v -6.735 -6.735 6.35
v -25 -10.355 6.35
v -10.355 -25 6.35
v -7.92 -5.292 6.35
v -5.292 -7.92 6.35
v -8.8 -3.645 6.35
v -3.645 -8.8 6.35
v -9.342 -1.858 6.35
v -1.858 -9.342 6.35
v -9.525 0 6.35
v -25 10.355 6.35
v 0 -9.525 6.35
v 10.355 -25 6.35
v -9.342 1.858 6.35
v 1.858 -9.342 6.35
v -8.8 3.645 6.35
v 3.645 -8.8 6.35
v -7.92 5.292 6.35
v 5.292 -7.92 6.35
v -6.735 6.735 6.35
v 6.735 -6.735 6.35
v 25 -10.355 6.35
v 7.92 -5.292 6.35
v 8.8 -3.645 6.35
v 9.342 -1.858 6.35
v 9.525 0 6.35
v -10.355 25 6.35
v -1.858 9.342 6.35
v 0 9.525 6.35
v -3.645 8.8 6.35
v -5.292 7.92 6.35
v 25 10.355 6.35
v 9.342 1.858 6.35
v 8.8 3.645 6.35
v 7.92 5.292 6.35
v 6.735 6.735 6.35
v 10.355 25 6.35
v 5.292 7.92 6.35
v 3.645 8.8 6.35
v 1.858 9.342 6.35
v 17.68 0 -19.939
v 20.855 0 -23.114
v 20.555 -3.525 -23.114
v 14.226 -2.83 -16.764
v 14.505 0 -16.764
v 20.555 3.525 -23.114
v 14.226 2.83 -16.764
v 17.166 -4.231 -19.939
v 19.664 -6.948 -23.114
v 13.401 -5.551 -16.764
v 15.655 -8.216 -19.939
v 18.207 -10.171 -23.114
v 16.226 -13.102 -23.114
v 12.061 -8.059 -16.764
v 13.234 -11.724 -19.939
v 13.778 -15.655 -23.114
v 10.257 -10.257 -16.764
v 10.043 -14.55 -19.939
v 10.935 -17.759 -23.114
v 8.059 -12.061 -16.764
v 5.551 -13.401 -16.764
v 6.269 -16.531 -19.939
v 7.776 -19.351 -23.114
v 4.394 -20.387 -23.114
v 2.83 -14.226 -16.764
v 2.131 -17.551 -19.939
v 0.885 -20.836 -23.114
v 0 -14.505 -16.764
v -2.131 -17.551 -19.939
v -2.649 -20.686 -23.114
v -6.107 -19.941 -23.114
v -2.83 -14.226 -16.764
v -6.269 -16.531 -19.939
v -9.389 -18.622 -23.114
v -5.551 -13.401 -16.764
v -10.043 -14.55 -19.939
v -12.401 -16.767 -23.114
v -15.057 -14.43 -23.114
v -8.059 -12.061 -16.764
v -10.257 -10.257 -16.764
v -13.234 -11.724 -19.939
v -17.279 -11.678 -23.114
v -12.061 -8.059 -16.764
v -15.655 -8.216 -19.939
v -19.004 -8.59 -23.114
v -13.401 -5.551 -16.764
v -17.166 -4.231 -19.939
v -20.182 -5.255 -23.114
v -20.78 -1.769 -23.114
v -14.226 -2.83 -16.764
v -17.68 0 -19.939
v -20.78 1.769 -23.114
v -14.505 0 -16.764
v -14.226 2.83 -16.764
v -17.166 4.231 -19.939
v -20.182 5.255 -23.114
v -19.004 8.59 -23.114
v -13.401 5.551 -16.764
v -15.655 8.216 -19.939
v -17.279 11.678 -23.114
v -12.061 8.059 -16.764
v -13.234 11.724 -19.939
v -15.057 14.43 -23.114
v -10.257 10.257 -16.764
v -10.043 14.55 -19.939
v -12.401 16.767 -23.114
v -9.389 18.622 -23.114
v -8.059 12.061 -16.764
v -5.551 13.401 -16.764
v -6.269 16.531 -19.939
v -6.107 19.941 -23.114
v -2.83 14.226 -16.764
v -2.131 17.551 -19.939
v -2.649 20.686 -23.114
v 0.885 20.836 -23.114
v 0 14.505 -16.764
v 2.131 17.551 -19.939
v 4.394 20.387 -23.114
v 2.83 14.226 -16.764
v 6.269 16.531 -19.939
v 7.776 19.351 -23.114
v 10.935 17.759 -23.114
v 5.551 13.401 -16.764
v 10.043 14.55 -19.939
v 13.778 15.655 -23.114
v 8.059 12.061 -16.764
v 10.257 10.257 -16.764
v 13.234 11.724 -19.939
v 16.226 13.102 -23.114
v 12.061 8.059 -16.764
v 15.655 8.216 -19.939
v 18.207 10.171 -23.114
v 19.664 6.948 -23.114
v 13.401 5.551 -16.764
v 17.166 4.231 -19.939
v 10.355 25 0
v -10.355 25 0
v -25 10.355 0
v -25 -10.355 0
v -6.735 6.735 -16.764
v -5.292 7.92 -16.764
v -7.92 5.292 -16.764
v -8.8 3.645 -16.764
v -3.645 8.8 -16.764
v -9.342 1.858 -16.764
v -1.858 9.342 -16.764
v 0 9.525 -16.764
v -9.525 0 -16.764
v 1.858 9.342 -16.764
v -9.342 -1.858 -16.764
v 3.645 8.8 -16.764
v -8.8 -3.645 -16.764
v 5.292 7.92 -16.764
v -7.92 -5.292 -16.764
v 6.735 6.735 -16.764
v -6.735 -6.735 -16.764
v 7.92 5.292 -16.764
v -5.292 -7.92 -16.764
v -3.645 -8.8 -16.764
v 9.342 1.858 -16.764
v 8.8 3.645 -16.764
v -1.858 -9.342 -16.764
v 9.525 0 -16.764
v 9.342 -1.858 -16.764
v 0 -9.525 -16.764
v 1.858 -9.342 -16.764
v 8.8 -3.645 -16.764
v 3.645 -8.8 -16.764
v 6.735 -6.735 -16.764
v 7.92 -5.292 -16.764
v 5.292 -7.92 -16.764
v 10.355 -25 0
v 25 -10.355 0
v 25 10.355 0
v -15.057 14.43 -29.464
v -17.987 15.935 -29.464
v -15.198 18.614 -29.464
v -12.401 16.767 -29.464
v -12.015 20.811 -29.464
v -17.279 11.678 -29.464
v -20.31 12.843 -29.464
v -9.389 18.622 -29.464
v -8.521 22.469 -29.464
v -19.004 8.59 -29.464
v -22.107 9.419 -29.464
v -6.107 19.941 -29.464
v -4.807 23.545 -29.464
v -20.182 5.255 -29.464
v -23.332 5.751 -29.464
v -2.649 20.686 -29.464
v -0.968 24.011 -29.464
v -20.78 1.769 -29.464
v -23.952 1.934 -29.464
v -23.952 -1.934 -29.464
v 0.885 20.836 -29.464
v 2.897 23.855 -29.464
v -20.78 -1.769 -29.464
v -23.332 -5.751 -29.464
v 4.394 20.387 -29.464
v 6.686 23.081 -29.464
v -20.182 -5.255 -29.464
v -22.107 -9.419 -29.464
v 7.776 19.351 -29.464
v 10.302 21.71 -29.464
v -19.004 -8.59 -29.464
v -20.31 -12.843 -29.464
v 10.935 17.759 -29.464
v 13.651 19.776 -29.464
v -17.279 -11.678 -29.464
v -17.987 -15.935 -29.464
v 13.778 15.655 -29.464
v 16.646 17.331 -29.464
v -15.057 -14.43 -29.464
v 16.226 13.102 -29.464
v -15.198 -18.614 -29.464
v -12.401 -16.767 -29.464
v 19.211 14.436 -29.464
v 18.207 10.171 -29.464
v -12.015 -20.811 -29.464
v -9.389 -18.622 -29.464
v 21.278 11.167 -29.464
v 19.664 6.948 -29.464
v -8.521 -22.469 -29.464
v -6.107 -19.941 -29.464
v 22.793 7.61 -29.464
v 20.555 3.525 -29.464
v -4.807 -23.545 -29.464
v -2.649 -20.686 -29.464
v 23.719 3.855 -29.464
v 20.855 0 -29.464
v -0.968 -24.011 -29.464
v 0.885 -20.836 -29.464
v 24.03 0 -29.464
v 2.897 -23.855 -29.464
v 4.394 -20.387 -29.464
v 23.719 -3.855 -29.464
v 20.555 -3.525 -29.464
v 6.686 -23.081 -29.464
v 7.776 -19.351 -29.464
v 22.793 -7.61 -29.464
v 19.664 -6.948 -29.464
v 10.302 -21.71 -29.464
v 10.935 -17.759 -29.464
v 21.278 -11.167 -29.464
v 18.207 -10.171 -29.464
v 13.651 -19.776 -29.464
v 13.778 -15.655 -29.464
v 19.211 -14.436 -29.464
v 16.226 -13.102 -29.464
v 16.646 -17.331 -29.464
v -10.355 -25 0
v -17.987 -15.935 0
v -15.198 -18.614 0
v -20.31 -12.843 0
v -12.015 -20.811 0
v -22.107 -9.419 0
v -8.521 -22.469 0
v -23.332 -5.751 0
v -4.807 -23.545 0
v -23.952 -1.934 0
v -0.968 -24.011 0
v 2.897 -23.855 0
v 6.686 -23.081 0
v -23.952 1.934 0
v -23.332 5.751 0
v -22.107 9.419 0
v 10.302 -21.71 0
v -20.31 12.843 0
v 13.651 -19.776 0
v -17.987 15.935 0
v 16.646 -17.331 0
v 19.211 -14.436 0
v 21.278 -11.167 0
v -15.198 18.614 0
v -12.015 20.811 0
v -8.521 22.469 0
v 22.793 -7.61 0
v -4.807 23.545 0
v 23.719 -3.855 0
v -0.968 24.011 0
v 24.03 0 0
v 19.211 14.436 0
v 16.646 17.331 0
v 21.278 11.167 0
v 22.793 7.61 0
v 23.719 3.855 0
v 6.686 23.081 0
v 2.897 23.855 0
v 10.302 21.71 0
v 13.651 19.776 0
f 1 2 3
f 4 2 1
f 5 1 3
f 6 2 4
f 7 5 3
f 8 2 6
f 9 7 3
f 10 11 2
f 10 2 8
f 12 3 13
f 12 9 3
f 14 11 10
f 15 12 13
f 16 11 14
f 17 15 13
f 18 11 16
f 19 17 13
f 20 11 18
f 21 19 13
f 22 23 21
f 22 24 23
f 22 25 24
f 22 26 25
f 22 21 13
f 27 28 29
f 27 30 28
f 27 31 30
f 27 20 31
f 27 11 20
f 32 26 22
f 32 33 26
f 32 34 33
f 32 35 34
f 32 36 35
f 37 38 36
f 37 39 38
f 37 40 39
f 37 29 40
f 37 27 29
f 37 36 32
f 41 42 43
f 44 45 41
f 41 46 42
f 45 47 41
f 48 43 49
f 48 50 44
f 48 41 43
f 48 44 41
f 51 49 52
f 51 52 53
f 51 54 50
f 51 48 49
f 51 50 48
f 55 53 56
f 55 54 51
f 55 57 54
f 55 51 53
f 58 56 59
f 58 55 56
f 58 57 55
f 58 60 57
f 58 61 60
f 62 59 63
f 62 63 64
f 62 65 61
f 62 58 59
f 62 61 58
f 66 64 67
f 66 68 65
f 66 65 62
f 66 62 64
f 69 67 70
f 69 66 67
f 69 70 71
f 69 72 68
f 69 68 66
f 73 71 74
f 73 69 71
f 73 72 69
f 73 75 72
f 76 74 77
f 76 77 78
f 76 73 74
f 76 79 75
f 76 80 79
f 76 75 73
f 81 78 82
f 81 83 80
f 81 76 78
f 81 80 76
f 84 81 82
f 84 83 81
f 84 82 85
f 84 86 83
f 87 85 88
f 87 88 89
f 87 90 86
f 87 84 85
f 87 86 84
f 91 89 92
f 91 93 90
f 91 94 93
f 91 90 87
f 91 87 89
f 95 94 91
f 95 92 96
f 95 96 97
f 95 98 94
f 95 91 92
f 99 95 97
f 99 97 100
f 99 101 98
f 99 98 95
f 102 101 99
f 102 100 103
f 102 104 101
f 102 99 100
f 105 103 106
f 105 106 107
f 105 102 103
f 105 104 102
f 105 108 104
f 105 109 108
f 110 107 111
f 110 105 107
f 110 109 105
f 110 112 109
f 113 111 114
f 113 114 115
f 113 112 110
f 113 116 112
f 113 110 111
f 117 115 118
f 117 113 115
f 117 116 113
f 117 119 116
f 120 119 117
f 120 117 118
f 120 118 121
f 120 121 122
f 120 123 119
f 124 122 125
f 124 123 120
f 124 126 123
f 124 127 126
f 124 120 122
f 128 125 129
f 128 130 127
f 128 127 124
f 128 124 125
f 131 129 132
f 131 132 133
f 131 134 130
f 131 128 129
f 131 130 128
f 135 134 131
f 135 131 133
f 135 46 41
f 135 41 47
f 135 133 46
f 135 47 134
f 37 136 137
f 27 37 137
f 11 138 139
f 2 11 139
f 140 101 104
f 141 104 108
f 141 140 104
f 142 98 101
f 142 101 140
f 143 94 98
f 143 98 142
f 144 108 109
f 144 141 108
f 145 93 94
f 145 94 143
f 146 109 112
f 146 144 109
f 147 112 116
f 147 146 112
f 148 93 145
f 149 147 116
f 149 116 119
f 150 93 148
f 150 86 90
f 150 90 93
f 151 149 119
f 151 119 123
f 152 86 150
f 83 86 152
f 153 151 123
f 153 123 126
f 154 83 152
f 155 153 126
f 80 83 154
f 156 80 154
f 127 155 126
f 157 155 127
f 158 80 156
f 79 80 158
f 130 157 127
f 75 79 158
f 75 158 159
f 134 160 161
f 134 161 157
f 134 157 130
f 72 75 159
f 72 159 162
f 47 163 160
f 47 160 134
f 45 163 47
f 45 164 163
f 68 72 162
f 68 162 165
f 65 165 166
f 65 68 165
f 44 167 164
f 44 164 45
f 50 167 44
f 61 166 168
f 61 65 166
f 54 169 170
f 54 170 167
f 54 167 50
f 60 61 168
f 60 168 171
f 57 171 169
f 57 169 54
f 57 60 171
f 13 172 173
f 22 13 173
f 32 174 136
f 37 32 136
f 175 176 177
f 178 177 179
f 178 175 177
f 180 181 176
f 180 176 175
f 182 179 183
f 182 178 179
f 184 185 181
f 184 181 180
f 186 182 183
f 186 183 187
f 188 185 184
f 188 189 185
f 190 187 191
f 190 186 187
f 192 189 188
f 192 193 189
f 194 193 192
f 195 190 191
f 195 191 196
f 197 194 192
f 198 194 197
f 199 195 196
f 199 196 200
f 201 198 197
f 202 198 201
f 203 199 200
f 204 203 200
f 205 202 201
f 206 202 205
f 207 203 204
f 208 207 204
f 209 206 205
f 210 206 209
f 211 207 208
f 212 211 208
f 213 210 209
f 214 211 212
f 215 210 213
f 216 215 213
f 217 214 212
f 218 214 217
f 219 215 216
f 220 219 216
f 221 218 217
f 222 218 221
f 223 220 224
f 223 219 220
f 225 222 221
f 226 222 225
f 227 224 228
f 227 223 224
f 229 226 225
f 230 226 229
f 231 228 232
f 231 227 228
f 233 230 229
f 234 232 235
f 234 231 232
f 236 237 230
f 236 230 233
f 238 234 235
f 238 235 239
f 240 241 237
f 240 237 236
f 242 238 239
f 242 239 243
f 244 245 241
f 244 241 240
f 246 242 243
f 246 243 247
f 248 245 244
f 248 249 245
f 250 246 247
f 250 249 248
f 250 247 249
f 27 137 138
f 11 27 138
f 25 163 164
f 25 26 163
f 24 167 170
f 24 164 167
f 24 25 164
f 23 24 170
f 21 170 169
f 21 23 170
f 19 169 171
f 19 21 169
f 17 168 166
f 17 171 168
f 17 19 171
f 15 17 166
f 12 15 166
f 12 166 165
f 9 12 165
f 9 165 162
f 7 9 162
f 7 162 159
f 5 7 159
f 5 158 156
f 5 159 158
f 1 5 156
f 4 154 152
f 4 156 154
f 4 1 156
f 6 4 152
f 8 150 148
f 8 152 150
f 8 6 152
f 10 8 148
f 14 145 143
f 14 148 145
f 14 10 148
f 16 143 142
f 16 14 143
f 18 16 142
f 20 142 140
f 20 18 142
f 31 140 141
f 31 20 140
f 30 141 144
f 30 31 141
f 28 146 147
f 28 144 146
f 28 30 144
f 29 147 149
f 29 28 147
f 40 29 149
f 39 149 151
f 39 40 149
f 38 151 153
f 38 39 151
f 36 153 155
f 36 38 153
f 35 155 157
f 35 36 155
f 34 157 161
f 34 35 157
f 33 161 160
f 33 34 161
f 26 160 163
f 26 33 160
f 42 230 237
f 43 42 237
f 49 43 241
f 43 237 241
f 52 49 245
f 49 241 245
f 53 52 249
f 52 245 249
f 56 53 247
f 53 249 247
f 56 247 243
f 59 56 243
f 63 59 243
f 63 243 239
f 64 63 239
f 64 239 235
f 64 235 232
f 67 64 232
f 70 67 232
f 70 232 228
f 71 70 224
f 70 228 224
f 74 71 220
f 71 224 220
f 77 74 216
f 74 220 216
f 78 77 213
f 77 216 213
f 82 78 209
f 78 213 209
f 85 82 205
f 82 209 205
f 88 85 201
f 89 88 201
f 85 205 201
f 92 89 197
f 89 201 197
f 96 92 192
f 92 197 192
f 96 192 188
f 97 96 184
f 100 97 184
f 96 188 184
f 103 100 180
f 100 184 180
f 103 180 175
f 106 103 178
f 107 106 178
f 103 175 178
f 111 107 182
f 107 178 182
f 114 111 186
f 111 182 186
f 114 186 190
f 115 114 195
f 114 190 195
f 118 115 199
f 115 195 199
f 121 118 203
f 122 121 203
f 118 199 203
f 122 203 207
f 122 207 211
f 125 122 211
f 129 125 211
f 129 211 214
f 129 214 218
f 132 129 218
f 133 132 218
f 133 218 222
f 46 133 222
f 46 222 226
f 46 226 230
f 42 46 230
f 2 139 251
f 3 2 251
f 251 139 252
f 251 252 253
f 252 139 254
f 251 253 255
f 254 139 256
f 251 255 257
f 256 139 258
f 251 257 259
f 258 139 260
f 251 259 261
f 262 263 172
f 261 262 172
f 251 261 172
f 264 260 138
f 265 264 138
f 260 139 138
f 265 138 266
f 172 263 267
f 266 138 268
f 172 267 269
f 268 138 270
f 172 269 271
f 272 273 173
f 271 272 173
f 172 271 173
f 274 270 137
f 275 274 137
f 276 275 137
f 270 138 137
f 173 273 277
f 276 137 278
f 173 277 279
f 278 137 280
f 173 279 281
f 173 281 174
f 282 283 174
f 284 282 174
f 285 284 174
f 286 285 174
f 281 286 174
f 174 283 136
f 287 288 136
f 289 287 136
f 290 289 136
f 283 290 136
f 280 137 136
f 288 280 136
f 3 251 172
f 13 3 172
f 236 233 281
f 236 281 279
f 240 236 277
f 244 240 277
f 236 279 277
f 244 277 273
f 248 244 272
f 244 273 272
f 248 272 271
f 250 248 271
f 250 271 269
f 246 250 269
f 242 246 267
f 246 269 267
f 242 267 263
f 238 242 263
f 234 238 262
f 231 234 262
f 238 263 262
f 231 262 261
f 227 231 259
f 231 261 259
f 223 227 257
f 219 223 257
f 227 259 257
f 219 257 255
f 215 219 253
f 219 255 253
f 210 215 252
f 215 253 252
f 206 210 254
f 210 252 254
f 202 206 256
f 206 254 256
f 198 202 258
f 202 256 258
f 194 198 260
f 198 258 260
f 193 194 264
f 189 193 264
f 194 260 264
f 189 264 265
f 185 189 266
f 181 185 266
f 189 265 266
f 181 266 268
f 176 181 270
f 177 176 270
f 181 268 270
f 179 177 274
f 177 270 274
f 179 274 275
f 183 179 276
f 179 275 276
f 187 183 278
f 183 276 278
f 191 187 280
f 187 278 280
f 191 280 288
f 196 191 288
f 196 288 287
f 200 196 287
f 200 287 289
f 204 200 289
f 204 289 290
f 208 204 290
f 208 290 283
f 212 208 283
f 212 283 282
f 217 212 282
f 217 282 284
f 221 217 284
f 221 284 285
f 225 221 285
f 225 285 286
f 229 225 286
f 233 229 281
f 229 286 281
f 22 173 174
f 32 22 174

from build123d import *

# Parameters (mm, degrees)
F0_R     = 9.525
F1_DEPTH = 6.35
F2_R     = 24.030165
F2_R_2   = 9.525
F3_DEPTH = 29.464
F4_R     = 20.855165
F5_DEPTH = 12.7
F6_SIZE  = 6.35


with BuildPart() as f1:
    # F0 (on Top) → F1 (new body)
    with BuildSketch(Plane.XY):
        Polygon((-10.355339, -25), (10.355339, -25), (25, -10.355339), (25, 10.355339), (10.355339, 25), (-10.355339, 25), (-25, 10.355339), (-25, -10.355339), align=None)
        Circle(F0_R, mode=Mode.SUBTRACT)
    extrude(amount=F1_DEPTH)

    # F2 (on face) → F3 (join)
    with BuildSketch(Plane(origin=(0, 0, 0), x_dir=(1, 0, 0), z_dir=(0, 0, -1))):
        Circle(F2_R)
        Circle(F2_R_2, mode=Mode.SUBTRACT)
    extrude(amount=F3_DEPTH)

    # F4 (on face) → F5 (cut)
    with BuildSketch(Plane(origin=(0, 0, -29.464), x_dir=(1, 0, 0), z_dir=(0, 0, -1))):
        Circle(F4_R)
    extrude(amount=-F5_DEPTH, mode=Mode.SUBTRACT)

    # F6
    f6_edges = [f1.edges().sort_by_distance(p)[0] for p in [
        (-20.855165, 0, -16.764),
    ]]
    chamfer(f6_edges, length=F6_SIZE)


solid = f1.part
